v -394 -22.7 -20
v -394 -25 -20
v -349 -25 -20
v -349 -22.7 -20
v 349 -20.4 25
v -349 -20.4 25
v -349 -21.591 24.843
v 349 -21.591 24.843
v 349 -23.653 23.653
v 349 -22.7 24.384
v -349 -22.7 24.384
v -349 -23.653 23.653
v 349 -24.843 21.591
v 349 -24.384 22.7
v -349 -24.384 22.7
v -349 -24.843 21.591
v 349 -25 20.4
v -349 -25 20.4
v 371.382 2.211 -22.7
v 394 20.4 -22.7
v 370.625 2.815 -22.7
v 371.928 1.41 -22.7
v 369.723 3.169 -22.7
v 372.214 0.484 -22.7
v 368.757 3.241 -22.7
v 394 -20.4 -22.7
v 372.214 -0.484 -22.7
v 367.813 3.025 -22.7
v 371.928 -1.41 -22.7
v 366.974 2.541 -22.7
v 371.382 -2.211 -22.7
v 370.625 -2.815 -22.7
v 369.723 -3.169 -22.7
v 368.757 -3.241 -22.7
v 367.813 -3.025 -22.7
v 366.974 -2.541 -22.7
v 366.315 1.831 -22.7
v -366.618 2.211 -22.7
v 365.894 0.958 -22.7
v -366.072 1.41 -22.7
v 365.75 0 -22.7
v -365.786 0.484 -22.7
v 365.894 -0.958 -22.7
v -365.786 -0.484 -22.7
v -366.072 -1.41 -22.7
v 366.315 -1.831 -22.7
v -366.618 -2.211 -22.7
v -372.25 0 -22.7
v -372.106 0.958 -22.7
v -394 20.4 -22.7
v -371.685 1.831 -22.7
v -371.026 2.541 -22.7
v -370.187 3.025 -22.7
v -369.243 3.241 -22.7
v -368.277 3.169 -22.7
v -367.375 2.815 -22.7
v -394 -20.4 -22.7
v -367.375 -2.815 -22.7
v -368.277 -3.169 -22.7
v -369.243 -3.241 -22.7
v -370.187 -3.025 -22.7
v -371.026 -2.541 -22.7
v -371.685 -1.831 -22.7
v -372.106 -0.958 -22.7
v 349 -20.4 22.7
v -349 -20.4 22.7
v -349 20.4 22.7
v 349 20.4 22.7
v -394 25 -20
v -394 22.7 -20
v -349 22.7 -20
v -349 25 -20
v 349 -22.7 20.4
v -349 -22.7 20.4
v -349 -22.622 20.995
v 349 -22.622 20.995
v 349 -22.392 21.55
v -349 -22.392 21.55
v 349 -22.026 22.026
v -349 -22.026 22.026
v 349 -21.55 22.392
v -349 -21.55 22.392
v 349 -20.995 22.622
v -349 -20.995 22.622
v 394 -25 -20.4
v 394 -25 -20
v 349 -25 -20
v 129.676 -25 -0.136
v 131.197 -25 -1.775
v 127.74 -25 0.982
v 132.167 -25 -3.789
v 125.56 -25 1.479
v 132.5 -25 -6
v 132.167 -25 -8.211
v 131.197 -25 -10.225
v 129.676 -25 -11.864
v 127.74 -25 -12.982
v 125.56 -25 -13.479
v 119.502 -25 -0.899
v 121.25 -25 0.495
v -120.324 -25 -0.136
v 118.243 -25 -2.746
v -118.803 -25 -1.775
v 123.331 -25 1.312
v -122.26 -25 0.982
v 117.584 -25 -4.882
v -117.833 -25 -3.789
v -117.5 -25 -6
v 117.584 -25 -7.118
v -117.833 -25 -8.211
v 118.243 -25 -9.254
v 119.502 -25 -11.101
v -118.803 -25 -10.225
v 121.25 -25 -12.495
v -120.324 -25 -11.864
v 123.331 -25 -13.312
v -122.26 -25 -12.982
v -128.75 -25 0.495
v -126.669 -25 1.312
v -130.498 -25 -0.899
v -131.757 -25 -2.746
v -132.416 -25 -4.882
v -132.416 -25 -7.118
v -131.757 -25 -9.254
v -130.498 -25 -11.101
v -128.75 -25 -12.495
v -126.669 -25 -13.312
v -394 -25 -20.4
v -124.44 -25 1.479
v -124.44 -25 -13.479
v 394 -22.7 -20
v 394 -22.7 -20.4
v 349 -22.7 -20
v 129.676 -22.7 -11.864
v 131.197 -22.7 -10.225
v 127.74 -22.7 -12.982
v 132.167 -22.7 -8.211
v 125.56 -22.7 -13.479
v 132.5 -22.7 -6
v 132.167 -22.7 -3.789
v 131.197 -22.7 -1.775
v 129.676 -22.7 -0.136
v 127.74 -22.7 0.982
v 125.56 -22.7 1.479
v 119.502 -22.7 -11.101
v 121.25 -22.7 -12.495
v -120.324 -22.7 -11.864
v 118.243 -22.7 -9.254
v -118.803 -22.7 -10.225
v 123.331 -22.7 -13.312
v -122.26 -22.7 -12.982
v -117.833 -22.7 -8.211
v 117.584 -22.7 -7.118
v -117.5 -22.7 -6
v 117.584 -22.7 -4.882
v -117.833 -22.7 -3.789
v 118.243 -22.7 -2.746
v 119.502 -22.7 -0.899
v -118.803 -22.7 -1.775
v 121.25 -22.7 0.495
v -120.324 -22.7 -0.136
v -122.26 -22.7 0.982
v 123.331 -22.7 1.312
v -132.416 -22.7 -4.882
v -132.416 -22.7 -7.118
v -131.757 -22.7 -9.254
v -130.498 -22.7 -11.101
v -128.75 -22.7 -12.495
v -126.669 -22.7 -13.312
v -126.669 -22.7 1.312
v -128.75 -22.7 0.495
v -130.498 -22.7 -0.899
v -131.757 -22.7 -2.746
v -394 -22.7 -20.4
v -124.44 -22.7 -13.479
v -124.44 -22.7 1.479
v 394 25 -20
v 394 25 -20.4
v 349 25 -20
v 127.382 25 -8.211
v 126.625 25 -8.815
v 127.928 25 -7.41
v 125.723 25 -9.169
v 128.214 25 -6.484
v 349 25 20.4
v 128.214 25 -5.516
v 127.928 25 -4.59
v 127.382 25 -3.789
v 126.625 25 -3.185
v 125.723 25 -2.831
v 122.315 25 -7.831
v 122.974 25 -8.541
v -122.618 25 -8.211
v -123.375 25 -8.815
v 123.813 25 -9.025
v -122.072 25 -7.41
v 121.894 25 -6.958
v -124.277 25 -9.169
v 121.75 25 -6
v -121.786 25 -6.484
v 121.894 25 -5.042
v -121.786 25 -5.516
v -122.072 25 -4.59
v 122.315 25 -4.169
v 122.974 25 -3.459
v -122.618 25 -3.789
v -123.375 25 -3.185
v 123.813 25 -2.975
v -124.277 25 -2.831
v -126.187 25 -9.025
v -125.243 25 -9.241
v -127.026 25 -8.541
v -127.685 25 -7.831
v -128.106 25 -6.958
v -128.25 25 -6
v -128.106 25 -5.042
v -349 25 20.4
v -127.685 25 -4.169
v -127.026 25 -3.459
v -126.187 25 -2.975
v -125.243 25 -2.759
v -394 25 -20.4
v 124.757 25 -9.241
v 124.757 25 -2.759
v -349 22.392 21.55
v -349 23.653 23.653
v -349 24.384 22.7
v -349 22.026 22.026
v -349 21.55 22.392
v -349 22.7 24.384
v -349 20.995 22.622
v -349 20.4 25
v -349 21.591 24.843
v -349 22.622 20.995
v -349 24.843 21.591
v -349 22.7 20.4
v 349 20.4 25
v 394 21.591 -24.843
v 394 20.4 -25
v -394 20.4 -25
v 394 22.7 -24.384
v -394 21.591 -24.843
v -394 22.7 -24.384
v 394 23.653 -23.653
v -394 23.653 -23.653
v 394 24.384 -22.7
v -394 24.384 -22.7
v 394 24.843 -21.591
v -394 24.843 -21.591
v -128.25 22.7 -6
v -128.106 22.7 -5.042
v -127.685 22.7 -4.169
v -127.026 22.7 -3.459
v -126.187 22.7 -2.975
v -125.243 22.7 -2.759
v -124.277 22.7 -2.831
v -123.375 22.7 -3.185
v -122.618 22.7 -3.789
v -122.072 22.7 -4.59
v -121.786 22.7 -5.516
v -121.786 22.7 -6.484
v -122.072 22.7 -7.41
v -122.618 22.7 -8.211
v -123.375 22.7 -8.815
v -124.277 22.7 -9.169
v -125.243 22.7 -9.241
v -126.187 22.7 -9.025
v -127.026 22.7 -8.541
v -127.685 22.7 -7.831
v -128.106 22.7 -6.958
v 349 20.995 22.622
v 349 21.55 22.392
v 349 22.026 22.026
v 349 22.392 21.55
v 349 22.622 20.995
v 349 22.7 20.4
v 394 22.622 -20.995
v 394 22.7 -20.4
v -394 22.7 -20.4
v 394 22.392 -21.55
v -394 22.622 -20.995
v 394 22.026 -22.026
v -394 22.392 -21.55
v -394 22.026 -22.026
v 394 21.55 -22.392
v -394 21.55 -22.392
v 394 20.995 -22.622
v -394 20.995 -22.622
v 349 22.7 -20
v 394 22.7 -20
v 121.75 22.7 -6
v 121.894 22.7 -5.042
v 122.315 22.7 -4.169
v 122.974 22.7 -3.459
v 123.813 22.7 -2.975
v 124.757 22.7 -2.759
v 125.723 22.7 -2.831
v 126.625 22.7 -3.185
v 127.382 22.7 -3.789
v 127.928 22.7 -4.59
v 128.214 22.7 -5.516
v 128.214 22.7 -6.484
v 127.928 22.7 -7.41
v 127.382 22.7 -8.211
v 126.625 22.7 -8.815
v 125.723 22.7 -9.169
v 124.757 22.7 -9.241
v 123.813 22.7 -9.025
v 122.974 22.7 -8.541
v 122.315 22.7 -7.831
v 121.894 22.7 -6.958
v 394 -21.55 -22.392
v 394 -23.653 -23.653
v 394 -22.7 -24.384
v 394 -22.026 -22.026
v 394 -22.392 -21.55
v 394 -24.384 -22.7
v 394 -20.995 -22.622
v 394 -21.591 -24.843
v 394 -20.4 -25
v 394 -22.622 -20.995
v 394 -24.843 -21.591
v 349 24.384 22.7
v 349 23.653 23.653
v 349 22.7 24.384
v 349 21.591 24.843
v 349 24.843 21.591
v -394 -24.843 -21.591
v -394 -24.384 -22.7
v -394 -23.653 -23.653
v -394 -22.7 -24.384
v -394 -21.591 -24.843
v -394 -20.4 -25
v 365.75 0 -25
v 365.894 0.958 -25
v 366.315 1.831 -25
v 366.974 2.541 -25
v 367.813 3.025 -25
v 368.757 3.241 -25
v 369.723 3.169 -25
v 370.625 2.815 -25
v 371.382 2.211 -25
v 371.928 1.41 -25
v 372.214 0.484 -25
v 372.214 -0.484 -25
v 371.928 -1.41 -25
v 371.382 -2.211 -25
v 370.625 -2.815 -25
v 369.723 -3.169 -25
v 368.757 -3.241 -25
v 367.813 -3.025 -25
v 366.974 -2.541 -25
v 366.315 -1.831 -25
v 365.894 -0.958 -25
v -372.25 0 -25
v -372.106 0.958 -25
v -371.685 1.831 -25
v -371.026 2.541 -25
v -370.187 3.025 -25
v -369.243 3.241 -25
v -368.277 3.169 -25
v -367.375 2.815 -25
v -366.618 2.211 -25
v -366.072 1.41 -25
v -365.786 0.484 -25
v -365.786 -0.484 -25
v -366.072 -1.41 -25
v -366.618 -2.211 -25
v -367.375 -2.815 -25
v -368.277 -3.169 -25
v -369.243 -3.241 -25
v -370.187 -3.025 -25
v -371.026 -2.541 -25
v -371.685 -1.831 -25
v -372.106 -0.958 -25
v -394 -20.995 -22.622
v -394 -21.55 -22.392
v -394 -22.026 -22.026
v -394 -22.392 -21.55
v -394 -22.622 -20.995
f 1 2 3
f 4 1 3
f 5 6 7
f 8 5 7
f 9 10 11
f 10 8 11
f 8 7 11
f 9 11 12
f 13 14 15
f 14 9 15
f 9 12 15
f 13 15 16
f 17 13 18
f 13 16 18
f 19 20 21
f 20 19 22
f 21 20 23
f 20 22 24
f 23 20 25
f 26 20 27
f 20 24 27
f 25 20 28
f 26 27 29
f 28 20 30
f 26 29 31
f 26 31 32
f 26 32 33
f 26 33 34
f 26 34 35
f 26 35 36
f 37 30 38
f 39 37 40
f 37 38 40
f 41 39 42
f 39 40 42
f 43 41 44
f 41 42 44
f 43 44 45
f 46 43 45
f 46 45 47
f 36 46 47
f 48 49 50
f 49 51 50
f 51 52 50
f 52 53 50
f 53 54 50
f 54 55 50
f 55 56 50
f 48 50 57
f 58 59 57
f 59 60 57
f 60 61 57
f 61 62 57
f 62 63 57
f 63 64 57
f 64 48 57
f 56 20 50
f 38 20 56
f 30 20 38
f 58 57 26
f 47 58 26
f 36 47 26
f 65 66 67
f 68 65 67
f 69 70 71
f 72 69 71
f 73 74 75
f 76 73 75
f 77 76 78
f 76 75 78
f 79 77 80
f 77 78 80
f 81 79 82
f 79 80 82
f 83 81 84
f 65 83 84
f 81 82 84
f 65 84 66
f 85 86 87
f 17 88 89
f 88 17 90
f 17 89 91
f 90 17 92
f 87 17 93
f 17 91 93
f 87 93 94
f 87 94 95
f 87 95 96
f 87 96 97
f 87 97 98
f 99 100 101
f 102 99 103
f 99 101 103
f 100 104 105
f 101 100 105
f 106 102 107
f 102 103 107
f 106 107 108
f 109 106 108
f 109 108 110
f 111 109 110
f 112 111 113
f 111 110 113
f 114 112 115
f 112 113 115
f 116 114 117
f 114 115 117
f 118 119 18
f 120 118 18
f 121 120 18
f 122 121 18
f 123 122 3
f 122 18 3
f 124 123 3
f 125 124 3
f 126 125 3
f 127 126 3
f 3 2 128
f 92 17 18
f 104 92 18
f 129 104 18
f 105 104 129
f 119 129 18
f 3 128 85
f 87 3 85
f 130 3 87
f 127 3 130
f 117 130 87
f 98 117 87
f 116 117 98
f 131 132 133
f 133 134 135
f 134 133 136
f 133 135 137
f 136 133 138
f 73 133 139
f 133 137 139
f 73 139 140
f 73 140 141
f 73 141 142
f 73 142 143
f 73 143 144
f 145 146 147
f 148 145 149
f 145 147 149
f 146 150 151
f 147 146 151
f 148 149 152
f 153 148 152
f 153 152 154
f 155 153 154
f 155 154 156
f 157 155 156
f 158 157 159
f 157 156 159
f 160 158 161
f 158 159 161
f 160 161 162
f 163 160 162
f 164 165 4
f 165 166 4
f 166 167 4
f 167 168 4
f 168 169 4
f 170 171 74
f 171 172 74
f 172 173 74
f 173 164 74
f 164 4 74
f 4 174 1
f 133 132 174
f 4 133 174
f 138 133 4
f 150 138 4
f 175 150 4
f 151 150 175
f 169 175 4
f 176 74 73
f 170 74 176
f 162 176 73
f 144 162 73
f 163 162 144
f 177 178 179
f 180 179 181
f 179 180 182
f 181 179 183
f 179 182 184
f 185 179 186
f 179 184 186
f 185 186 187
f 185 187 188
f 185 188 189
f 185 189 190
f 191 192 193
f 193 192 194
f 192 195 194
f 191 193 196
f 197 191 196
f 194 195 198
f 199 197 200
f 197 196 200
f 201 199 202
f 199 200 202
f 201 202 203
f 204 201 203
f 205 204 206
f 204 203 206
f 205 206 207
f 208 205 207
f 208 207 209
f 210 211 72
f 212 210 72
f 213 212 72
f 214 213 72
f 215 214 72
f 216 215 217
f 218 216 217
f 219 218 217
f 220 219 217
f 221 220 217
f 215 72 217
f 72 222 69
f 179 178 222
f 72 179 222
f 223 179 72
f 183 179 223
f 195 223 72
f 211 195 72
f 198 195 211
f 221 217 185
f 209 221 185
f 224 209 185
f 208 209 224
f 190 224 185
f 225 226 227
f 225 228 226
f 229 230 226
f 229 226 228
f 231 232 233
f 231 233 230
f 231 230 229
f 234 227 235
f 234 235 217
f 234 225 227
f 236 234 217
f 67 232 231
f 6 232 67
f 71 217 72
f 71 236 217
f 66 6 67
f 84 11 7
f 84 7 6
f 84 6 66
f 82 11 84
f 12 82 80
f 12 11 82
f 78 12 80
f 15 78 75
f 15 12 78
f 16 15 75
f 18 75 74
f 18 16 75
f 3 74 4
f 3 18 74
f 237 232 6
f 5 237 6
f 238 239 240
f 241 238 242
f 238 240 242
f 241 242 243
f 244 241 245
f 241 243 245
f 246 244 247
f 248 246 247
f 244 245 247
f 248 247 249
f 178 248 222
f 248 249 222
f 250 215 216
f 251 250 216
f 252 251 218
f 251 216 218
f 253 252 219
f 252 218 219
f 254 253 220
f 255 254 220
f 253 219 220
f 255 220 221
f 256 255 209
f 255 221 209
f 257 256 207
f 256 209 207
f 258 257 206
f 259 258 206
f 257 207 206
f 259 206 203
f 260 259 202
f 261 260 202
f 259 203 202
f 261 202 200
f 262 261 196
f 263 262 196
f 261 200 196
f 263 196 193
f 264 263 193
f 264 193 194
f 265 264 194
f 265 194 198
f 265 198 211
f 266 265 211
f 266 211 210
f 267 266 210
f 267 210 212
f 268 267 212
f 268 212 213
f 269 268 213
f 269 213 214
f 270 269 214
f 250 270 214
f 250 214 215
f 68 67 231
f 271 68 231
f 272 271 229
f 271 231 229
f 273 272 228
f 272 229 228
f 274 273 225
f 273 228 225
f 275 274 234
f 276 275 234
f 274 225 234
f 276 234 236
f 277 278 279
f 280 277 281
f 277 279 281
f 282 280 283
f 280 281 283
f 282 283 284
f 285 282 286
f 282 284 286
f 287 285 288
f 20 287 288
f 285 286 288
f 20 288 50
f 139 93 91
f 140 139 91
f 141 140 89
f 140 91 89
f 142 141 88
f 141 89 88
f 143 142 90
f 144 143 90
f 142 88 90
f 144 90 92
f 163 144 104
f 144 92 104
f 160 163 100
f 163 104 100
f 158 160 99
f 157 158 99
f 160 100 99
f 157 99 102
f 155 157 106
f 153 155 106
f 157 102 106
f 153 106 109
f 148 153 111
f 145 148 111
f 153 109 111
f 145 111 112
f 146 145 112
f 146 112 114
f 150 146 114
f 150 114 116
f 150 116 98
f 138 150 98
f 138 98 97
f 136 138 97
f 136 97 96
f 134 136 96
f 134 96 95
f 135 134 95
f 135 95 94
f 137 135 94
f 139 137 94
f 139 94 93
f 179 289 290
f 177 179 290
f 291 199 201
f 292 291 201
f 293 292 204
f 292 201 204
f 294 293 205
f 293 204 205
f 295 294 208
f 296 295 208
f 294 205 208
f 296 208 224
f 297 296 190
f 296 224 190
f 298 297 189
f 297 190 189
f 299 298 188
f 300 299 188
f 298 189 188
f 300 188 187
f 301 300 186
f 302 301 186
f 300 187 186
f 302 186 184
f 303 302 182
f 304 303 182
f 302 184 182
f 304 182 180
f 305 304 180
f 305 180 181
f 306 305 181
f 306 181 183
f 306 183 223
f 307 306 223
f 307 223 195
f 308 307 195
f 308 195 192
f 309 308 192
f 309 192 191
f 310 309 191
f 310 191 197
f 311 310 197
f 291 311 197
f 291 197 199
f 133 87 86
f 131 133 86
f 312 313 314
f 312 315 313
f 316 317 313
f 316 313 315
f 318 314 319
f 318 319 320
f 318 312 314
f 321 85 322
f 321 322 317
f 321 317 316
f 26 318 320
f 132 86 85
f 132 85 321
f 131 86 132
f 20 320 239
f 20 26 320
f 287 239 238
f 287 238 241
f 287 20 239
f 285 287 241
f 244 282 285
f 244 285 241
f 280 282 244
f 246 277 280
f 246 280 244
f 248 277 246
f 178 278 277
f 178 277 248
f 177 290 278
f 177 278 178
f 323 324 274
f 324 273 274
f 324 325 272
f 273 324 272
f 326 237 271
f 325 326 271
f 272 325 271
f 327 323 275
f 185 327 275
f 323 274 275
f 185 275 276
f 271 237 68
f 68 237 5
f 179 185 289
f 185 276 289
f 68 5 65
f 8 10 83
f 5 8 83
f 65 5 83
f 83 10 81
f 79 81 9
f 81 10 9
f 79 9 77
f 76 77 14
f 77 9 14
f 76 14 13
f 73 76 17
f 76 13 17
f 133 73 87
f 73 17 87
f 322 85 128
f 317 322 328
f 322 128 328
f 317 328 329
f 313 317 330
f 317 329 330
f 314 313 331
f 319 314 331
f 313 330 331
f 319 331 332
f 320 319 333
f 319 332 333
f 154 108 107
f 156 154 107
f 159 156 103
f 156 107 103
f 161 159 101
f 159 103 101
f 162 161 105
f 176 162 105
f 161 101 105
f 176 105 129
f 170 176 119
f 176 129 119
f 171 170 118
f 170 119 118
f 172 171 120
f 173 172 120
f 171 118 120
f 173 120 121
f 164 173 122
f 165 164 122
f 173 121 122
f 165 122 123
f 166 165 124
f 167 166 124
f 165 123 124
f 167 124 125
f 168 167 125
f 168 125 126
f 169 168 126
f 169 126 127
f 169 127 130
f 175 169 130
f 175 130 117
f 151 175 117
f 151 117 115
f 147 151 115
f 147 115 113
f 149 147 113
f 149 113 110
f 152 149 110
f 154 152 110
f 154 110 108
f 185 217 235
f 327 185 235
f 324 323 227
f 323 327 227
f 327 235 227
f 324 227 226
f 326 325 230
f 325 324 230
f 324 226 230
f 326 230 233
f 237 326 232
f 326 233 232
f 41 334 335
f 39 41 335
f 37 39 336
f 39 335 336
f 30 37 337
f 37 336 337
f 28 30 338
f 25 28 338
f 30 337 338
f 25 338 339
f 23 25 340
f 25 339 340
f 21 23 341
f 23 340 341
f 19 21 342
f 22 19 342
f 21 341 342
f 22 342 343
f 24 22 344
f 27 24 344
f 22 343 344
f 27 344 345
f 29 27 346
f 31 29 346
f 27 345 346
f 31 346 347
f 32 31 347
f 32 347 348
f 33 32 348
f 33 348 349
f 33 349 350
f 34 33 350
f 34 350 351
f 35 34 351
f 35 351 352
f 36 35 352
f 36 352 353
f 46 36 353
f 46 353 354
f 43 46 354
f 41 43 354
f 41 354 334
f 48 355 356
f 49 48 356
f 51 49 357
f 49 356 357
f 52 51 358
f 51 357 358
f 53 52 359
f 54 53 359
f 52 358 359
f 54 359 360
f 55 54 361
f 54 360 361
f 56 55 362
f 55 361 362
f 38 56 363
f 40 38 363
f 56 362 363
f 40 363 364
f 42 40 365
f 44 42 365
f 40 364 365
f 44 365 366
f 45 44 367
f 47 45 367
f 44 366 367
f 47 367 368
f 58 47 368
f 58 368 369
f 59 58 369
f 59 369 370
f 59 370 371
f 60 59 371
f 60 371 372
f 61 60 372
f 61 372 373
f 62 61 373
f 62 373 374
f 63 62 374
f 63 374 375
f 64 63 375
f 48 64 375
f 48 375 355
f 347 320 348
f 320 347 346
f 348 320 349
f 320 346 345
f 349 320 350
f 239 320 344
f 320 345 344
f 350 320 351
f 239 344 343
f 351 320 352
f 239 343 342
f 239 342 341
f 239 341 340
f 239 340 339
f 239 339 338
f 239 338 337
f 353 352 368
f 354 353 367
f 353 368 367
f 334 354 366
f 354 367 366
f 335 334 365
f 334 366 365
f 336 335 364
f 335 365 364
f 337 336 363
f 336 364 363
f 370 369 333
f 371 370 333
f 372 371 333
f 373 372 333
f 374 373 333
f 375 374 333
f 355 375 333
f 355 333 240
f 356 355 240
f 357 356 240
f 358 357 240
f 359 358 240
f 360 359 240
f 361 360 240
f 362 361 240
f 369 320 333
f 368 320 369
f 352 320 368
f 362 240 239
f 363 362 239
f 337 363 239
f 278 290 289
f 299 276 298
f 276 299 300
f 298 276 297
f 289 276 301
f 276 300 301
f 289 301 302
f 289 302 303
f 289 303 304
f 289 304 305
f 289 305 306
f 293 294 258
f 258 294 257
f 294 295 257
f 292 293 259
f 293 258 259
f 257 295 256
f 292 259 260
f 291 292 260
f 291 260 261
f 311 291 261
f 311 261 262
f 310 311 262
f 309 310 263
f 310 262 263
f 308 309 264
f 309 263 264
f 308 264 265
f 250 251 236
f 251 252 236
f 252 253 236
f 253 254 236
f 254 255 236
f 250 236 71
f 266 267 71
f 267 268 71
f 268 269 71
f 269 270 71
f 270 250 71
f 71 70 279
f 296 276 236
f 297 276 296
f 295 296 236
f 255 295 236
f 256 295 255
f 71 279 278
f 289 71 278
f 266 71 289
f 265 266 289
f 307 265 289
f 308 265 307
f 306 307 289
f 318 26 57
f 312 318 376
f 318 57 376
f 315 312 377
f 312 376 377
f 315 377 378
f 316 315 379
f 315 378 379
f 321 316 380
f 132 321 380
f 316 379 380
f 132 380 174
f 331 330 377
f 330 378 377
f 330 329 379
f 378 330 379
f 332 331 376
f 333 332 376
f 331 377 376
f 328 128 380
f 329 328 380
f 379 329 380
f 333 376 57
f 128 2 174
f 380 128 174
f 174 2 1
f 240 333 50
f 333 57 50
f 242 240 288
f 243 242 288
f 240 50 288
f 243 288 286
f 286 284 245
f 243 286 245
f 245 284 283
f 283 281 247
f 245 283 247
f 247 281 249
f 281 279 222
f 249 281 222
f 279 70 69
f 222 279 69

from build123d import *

# Parameters (mm, degrees)
SHS_C450_AS_50X50X2_3_SHS_C450_1_DEPTH = 788
CUT_EXTRUDE1_DEPTH                     = 396.583113896
CUT_EXTRUDE1_DEPTH_BACK                = 396.583113896
SKETCH20_W                             = 45
SKETCH20_H                             = 45
SKETCH21_R                             = 3.25
CUT_EXTRUDE2_DEPTH                     = 10
SKETCH22_R                             = 3.25
CUT_EXTRUDE3_DEPTH                     = 10
SKETCH23_R                             = 7.5
CUT_EXTRUDE4_DEPTH                     = 10


with BuildPart() as part:
    # Sketch19 → Shs c450 as 50X50X2.3 SHS C450(1) (new body)
    with BuildSketch(Plane.YZ.offset(-394)):
        with BuildLine():
            Line((-20.4, -25), (20.4, -25))
            ThreePointArc((20.4, -25), (23.652691193, -23.652691193), (25, -20.4))
            Line((25, -20.4), (25, 20.4))
            ThreePointArc((25, 20.4), (23.652691193, 23.652691193), (20.4, 25))
            Line((20.4, 25), (-20.4, 25))
            ThreePointArc((-20.4, 25), (-23.652691193, 23.652691193), (-25, 20.4))
            Line((-25, 20.4), (-25, -20.4))
            ThreePointArc((-25, -20.4), (-23.652691193, -23.652691193), (-20.4, -25))
        make_face()
        with BuildLine():
            Line((-20.4, 22.7), (20.4, 22.7))
            ThreePointArc((20.4, 22.7), (22.026345597, 22.026345597), (22.7, 20.4))
            Line((22.7, 20.4), (22.7, -20.4))
            ThreePointArc((22.7, -20.4), (22.026345597, -22.026345597), (20.4, -22.7))
            Line((20.4, -22.7), (-20.4, -22.7))
            ThreePointArc((-20.4, -22.7), (-22.026345597, -22.026345597), (-22.7, -20.4))
            Line((-22.7, -20.4), (-22.7, 20.4))
            ThreePointArc((-22.7, 20.4), (-22.026345597, 22.026345597), (-20.4, 22.7))
        make_face(mode=Mode.SUBTRACT)
    extrude(amount=SHS_C450_AS_50X50X2_3_SHS_C450_1_DEPTH)

    # Sketch20 → Cut-Extrude1 (cut, two sides: drawn at the far end of the back side and taken through both)
    with BuildSketch(Plane(origin=(0, 0, 0), x_dir=(1, 0, 0), z_dir=(0, 1, 0)).offset(-CUT_EXTRUDE1_DEPTH_BACK)):
        with Locations((-371.5, -2.5)):
            Rectangle(SKETCH20_W, SKETCH20_H)
        with Locations((371.5, -2.5)):
            Rectangle(SKETCH20_W, SKETCH20_H)
    extrude(amount=CUT_EXTRUDE1_DEPTH + CUT_EXTRUDE1_DEPTH_BACK, mode=Mode.SUBTRACT)

    # Sketch21 → Cut-Extrude2 (cut)
    with BuildSketch(Plane(origin=(0, 0, -25), x_dir=(-1, 0, 0), z_dir=(0, 0, -1))):
        with Locations((-369, 0)):
            Circle(SKETCH21_R)
        with Locations((369, 0)):
            Circle(SKETCH21_R)
    extrude(amount=-CUT_EXTRUDE2_DEPTH, mode=Mode.SUBTRACT)

    # Sketch22 → Cut-Extrude3 (cut)
    with BuildSketch(Plane(origin=(0, 25, 0), x_dir=(1, 0, 0), z_dir=(0, 1, 0))):
        with Locations(Location((-125, 6, 0), (0, 0, 180))):
            Circle(SKETCH22_R)
        with Locations(Location((125, 6, 0), (0, 0, 180))):
            Circle(SKETCH22_R)
    extrude(amount=-CUT_EXTRUDE3_DEPTH, mode=Mode.SUBTRACT)

    # Sketch23 → Cut-Extrude4 (cut)
    with BuildSketch(Plane.XZ.offset(25)):
        with Locations((-125, -6)):
            Circle(SKETCH23_R)
        with Locations((125, -6)):
            Circle(SKETCH23_R)
    extrude(amount=-CUT_EXTRUDE4_DEPTH, mode=Mode.SUBTRACT)


solid = part.part
